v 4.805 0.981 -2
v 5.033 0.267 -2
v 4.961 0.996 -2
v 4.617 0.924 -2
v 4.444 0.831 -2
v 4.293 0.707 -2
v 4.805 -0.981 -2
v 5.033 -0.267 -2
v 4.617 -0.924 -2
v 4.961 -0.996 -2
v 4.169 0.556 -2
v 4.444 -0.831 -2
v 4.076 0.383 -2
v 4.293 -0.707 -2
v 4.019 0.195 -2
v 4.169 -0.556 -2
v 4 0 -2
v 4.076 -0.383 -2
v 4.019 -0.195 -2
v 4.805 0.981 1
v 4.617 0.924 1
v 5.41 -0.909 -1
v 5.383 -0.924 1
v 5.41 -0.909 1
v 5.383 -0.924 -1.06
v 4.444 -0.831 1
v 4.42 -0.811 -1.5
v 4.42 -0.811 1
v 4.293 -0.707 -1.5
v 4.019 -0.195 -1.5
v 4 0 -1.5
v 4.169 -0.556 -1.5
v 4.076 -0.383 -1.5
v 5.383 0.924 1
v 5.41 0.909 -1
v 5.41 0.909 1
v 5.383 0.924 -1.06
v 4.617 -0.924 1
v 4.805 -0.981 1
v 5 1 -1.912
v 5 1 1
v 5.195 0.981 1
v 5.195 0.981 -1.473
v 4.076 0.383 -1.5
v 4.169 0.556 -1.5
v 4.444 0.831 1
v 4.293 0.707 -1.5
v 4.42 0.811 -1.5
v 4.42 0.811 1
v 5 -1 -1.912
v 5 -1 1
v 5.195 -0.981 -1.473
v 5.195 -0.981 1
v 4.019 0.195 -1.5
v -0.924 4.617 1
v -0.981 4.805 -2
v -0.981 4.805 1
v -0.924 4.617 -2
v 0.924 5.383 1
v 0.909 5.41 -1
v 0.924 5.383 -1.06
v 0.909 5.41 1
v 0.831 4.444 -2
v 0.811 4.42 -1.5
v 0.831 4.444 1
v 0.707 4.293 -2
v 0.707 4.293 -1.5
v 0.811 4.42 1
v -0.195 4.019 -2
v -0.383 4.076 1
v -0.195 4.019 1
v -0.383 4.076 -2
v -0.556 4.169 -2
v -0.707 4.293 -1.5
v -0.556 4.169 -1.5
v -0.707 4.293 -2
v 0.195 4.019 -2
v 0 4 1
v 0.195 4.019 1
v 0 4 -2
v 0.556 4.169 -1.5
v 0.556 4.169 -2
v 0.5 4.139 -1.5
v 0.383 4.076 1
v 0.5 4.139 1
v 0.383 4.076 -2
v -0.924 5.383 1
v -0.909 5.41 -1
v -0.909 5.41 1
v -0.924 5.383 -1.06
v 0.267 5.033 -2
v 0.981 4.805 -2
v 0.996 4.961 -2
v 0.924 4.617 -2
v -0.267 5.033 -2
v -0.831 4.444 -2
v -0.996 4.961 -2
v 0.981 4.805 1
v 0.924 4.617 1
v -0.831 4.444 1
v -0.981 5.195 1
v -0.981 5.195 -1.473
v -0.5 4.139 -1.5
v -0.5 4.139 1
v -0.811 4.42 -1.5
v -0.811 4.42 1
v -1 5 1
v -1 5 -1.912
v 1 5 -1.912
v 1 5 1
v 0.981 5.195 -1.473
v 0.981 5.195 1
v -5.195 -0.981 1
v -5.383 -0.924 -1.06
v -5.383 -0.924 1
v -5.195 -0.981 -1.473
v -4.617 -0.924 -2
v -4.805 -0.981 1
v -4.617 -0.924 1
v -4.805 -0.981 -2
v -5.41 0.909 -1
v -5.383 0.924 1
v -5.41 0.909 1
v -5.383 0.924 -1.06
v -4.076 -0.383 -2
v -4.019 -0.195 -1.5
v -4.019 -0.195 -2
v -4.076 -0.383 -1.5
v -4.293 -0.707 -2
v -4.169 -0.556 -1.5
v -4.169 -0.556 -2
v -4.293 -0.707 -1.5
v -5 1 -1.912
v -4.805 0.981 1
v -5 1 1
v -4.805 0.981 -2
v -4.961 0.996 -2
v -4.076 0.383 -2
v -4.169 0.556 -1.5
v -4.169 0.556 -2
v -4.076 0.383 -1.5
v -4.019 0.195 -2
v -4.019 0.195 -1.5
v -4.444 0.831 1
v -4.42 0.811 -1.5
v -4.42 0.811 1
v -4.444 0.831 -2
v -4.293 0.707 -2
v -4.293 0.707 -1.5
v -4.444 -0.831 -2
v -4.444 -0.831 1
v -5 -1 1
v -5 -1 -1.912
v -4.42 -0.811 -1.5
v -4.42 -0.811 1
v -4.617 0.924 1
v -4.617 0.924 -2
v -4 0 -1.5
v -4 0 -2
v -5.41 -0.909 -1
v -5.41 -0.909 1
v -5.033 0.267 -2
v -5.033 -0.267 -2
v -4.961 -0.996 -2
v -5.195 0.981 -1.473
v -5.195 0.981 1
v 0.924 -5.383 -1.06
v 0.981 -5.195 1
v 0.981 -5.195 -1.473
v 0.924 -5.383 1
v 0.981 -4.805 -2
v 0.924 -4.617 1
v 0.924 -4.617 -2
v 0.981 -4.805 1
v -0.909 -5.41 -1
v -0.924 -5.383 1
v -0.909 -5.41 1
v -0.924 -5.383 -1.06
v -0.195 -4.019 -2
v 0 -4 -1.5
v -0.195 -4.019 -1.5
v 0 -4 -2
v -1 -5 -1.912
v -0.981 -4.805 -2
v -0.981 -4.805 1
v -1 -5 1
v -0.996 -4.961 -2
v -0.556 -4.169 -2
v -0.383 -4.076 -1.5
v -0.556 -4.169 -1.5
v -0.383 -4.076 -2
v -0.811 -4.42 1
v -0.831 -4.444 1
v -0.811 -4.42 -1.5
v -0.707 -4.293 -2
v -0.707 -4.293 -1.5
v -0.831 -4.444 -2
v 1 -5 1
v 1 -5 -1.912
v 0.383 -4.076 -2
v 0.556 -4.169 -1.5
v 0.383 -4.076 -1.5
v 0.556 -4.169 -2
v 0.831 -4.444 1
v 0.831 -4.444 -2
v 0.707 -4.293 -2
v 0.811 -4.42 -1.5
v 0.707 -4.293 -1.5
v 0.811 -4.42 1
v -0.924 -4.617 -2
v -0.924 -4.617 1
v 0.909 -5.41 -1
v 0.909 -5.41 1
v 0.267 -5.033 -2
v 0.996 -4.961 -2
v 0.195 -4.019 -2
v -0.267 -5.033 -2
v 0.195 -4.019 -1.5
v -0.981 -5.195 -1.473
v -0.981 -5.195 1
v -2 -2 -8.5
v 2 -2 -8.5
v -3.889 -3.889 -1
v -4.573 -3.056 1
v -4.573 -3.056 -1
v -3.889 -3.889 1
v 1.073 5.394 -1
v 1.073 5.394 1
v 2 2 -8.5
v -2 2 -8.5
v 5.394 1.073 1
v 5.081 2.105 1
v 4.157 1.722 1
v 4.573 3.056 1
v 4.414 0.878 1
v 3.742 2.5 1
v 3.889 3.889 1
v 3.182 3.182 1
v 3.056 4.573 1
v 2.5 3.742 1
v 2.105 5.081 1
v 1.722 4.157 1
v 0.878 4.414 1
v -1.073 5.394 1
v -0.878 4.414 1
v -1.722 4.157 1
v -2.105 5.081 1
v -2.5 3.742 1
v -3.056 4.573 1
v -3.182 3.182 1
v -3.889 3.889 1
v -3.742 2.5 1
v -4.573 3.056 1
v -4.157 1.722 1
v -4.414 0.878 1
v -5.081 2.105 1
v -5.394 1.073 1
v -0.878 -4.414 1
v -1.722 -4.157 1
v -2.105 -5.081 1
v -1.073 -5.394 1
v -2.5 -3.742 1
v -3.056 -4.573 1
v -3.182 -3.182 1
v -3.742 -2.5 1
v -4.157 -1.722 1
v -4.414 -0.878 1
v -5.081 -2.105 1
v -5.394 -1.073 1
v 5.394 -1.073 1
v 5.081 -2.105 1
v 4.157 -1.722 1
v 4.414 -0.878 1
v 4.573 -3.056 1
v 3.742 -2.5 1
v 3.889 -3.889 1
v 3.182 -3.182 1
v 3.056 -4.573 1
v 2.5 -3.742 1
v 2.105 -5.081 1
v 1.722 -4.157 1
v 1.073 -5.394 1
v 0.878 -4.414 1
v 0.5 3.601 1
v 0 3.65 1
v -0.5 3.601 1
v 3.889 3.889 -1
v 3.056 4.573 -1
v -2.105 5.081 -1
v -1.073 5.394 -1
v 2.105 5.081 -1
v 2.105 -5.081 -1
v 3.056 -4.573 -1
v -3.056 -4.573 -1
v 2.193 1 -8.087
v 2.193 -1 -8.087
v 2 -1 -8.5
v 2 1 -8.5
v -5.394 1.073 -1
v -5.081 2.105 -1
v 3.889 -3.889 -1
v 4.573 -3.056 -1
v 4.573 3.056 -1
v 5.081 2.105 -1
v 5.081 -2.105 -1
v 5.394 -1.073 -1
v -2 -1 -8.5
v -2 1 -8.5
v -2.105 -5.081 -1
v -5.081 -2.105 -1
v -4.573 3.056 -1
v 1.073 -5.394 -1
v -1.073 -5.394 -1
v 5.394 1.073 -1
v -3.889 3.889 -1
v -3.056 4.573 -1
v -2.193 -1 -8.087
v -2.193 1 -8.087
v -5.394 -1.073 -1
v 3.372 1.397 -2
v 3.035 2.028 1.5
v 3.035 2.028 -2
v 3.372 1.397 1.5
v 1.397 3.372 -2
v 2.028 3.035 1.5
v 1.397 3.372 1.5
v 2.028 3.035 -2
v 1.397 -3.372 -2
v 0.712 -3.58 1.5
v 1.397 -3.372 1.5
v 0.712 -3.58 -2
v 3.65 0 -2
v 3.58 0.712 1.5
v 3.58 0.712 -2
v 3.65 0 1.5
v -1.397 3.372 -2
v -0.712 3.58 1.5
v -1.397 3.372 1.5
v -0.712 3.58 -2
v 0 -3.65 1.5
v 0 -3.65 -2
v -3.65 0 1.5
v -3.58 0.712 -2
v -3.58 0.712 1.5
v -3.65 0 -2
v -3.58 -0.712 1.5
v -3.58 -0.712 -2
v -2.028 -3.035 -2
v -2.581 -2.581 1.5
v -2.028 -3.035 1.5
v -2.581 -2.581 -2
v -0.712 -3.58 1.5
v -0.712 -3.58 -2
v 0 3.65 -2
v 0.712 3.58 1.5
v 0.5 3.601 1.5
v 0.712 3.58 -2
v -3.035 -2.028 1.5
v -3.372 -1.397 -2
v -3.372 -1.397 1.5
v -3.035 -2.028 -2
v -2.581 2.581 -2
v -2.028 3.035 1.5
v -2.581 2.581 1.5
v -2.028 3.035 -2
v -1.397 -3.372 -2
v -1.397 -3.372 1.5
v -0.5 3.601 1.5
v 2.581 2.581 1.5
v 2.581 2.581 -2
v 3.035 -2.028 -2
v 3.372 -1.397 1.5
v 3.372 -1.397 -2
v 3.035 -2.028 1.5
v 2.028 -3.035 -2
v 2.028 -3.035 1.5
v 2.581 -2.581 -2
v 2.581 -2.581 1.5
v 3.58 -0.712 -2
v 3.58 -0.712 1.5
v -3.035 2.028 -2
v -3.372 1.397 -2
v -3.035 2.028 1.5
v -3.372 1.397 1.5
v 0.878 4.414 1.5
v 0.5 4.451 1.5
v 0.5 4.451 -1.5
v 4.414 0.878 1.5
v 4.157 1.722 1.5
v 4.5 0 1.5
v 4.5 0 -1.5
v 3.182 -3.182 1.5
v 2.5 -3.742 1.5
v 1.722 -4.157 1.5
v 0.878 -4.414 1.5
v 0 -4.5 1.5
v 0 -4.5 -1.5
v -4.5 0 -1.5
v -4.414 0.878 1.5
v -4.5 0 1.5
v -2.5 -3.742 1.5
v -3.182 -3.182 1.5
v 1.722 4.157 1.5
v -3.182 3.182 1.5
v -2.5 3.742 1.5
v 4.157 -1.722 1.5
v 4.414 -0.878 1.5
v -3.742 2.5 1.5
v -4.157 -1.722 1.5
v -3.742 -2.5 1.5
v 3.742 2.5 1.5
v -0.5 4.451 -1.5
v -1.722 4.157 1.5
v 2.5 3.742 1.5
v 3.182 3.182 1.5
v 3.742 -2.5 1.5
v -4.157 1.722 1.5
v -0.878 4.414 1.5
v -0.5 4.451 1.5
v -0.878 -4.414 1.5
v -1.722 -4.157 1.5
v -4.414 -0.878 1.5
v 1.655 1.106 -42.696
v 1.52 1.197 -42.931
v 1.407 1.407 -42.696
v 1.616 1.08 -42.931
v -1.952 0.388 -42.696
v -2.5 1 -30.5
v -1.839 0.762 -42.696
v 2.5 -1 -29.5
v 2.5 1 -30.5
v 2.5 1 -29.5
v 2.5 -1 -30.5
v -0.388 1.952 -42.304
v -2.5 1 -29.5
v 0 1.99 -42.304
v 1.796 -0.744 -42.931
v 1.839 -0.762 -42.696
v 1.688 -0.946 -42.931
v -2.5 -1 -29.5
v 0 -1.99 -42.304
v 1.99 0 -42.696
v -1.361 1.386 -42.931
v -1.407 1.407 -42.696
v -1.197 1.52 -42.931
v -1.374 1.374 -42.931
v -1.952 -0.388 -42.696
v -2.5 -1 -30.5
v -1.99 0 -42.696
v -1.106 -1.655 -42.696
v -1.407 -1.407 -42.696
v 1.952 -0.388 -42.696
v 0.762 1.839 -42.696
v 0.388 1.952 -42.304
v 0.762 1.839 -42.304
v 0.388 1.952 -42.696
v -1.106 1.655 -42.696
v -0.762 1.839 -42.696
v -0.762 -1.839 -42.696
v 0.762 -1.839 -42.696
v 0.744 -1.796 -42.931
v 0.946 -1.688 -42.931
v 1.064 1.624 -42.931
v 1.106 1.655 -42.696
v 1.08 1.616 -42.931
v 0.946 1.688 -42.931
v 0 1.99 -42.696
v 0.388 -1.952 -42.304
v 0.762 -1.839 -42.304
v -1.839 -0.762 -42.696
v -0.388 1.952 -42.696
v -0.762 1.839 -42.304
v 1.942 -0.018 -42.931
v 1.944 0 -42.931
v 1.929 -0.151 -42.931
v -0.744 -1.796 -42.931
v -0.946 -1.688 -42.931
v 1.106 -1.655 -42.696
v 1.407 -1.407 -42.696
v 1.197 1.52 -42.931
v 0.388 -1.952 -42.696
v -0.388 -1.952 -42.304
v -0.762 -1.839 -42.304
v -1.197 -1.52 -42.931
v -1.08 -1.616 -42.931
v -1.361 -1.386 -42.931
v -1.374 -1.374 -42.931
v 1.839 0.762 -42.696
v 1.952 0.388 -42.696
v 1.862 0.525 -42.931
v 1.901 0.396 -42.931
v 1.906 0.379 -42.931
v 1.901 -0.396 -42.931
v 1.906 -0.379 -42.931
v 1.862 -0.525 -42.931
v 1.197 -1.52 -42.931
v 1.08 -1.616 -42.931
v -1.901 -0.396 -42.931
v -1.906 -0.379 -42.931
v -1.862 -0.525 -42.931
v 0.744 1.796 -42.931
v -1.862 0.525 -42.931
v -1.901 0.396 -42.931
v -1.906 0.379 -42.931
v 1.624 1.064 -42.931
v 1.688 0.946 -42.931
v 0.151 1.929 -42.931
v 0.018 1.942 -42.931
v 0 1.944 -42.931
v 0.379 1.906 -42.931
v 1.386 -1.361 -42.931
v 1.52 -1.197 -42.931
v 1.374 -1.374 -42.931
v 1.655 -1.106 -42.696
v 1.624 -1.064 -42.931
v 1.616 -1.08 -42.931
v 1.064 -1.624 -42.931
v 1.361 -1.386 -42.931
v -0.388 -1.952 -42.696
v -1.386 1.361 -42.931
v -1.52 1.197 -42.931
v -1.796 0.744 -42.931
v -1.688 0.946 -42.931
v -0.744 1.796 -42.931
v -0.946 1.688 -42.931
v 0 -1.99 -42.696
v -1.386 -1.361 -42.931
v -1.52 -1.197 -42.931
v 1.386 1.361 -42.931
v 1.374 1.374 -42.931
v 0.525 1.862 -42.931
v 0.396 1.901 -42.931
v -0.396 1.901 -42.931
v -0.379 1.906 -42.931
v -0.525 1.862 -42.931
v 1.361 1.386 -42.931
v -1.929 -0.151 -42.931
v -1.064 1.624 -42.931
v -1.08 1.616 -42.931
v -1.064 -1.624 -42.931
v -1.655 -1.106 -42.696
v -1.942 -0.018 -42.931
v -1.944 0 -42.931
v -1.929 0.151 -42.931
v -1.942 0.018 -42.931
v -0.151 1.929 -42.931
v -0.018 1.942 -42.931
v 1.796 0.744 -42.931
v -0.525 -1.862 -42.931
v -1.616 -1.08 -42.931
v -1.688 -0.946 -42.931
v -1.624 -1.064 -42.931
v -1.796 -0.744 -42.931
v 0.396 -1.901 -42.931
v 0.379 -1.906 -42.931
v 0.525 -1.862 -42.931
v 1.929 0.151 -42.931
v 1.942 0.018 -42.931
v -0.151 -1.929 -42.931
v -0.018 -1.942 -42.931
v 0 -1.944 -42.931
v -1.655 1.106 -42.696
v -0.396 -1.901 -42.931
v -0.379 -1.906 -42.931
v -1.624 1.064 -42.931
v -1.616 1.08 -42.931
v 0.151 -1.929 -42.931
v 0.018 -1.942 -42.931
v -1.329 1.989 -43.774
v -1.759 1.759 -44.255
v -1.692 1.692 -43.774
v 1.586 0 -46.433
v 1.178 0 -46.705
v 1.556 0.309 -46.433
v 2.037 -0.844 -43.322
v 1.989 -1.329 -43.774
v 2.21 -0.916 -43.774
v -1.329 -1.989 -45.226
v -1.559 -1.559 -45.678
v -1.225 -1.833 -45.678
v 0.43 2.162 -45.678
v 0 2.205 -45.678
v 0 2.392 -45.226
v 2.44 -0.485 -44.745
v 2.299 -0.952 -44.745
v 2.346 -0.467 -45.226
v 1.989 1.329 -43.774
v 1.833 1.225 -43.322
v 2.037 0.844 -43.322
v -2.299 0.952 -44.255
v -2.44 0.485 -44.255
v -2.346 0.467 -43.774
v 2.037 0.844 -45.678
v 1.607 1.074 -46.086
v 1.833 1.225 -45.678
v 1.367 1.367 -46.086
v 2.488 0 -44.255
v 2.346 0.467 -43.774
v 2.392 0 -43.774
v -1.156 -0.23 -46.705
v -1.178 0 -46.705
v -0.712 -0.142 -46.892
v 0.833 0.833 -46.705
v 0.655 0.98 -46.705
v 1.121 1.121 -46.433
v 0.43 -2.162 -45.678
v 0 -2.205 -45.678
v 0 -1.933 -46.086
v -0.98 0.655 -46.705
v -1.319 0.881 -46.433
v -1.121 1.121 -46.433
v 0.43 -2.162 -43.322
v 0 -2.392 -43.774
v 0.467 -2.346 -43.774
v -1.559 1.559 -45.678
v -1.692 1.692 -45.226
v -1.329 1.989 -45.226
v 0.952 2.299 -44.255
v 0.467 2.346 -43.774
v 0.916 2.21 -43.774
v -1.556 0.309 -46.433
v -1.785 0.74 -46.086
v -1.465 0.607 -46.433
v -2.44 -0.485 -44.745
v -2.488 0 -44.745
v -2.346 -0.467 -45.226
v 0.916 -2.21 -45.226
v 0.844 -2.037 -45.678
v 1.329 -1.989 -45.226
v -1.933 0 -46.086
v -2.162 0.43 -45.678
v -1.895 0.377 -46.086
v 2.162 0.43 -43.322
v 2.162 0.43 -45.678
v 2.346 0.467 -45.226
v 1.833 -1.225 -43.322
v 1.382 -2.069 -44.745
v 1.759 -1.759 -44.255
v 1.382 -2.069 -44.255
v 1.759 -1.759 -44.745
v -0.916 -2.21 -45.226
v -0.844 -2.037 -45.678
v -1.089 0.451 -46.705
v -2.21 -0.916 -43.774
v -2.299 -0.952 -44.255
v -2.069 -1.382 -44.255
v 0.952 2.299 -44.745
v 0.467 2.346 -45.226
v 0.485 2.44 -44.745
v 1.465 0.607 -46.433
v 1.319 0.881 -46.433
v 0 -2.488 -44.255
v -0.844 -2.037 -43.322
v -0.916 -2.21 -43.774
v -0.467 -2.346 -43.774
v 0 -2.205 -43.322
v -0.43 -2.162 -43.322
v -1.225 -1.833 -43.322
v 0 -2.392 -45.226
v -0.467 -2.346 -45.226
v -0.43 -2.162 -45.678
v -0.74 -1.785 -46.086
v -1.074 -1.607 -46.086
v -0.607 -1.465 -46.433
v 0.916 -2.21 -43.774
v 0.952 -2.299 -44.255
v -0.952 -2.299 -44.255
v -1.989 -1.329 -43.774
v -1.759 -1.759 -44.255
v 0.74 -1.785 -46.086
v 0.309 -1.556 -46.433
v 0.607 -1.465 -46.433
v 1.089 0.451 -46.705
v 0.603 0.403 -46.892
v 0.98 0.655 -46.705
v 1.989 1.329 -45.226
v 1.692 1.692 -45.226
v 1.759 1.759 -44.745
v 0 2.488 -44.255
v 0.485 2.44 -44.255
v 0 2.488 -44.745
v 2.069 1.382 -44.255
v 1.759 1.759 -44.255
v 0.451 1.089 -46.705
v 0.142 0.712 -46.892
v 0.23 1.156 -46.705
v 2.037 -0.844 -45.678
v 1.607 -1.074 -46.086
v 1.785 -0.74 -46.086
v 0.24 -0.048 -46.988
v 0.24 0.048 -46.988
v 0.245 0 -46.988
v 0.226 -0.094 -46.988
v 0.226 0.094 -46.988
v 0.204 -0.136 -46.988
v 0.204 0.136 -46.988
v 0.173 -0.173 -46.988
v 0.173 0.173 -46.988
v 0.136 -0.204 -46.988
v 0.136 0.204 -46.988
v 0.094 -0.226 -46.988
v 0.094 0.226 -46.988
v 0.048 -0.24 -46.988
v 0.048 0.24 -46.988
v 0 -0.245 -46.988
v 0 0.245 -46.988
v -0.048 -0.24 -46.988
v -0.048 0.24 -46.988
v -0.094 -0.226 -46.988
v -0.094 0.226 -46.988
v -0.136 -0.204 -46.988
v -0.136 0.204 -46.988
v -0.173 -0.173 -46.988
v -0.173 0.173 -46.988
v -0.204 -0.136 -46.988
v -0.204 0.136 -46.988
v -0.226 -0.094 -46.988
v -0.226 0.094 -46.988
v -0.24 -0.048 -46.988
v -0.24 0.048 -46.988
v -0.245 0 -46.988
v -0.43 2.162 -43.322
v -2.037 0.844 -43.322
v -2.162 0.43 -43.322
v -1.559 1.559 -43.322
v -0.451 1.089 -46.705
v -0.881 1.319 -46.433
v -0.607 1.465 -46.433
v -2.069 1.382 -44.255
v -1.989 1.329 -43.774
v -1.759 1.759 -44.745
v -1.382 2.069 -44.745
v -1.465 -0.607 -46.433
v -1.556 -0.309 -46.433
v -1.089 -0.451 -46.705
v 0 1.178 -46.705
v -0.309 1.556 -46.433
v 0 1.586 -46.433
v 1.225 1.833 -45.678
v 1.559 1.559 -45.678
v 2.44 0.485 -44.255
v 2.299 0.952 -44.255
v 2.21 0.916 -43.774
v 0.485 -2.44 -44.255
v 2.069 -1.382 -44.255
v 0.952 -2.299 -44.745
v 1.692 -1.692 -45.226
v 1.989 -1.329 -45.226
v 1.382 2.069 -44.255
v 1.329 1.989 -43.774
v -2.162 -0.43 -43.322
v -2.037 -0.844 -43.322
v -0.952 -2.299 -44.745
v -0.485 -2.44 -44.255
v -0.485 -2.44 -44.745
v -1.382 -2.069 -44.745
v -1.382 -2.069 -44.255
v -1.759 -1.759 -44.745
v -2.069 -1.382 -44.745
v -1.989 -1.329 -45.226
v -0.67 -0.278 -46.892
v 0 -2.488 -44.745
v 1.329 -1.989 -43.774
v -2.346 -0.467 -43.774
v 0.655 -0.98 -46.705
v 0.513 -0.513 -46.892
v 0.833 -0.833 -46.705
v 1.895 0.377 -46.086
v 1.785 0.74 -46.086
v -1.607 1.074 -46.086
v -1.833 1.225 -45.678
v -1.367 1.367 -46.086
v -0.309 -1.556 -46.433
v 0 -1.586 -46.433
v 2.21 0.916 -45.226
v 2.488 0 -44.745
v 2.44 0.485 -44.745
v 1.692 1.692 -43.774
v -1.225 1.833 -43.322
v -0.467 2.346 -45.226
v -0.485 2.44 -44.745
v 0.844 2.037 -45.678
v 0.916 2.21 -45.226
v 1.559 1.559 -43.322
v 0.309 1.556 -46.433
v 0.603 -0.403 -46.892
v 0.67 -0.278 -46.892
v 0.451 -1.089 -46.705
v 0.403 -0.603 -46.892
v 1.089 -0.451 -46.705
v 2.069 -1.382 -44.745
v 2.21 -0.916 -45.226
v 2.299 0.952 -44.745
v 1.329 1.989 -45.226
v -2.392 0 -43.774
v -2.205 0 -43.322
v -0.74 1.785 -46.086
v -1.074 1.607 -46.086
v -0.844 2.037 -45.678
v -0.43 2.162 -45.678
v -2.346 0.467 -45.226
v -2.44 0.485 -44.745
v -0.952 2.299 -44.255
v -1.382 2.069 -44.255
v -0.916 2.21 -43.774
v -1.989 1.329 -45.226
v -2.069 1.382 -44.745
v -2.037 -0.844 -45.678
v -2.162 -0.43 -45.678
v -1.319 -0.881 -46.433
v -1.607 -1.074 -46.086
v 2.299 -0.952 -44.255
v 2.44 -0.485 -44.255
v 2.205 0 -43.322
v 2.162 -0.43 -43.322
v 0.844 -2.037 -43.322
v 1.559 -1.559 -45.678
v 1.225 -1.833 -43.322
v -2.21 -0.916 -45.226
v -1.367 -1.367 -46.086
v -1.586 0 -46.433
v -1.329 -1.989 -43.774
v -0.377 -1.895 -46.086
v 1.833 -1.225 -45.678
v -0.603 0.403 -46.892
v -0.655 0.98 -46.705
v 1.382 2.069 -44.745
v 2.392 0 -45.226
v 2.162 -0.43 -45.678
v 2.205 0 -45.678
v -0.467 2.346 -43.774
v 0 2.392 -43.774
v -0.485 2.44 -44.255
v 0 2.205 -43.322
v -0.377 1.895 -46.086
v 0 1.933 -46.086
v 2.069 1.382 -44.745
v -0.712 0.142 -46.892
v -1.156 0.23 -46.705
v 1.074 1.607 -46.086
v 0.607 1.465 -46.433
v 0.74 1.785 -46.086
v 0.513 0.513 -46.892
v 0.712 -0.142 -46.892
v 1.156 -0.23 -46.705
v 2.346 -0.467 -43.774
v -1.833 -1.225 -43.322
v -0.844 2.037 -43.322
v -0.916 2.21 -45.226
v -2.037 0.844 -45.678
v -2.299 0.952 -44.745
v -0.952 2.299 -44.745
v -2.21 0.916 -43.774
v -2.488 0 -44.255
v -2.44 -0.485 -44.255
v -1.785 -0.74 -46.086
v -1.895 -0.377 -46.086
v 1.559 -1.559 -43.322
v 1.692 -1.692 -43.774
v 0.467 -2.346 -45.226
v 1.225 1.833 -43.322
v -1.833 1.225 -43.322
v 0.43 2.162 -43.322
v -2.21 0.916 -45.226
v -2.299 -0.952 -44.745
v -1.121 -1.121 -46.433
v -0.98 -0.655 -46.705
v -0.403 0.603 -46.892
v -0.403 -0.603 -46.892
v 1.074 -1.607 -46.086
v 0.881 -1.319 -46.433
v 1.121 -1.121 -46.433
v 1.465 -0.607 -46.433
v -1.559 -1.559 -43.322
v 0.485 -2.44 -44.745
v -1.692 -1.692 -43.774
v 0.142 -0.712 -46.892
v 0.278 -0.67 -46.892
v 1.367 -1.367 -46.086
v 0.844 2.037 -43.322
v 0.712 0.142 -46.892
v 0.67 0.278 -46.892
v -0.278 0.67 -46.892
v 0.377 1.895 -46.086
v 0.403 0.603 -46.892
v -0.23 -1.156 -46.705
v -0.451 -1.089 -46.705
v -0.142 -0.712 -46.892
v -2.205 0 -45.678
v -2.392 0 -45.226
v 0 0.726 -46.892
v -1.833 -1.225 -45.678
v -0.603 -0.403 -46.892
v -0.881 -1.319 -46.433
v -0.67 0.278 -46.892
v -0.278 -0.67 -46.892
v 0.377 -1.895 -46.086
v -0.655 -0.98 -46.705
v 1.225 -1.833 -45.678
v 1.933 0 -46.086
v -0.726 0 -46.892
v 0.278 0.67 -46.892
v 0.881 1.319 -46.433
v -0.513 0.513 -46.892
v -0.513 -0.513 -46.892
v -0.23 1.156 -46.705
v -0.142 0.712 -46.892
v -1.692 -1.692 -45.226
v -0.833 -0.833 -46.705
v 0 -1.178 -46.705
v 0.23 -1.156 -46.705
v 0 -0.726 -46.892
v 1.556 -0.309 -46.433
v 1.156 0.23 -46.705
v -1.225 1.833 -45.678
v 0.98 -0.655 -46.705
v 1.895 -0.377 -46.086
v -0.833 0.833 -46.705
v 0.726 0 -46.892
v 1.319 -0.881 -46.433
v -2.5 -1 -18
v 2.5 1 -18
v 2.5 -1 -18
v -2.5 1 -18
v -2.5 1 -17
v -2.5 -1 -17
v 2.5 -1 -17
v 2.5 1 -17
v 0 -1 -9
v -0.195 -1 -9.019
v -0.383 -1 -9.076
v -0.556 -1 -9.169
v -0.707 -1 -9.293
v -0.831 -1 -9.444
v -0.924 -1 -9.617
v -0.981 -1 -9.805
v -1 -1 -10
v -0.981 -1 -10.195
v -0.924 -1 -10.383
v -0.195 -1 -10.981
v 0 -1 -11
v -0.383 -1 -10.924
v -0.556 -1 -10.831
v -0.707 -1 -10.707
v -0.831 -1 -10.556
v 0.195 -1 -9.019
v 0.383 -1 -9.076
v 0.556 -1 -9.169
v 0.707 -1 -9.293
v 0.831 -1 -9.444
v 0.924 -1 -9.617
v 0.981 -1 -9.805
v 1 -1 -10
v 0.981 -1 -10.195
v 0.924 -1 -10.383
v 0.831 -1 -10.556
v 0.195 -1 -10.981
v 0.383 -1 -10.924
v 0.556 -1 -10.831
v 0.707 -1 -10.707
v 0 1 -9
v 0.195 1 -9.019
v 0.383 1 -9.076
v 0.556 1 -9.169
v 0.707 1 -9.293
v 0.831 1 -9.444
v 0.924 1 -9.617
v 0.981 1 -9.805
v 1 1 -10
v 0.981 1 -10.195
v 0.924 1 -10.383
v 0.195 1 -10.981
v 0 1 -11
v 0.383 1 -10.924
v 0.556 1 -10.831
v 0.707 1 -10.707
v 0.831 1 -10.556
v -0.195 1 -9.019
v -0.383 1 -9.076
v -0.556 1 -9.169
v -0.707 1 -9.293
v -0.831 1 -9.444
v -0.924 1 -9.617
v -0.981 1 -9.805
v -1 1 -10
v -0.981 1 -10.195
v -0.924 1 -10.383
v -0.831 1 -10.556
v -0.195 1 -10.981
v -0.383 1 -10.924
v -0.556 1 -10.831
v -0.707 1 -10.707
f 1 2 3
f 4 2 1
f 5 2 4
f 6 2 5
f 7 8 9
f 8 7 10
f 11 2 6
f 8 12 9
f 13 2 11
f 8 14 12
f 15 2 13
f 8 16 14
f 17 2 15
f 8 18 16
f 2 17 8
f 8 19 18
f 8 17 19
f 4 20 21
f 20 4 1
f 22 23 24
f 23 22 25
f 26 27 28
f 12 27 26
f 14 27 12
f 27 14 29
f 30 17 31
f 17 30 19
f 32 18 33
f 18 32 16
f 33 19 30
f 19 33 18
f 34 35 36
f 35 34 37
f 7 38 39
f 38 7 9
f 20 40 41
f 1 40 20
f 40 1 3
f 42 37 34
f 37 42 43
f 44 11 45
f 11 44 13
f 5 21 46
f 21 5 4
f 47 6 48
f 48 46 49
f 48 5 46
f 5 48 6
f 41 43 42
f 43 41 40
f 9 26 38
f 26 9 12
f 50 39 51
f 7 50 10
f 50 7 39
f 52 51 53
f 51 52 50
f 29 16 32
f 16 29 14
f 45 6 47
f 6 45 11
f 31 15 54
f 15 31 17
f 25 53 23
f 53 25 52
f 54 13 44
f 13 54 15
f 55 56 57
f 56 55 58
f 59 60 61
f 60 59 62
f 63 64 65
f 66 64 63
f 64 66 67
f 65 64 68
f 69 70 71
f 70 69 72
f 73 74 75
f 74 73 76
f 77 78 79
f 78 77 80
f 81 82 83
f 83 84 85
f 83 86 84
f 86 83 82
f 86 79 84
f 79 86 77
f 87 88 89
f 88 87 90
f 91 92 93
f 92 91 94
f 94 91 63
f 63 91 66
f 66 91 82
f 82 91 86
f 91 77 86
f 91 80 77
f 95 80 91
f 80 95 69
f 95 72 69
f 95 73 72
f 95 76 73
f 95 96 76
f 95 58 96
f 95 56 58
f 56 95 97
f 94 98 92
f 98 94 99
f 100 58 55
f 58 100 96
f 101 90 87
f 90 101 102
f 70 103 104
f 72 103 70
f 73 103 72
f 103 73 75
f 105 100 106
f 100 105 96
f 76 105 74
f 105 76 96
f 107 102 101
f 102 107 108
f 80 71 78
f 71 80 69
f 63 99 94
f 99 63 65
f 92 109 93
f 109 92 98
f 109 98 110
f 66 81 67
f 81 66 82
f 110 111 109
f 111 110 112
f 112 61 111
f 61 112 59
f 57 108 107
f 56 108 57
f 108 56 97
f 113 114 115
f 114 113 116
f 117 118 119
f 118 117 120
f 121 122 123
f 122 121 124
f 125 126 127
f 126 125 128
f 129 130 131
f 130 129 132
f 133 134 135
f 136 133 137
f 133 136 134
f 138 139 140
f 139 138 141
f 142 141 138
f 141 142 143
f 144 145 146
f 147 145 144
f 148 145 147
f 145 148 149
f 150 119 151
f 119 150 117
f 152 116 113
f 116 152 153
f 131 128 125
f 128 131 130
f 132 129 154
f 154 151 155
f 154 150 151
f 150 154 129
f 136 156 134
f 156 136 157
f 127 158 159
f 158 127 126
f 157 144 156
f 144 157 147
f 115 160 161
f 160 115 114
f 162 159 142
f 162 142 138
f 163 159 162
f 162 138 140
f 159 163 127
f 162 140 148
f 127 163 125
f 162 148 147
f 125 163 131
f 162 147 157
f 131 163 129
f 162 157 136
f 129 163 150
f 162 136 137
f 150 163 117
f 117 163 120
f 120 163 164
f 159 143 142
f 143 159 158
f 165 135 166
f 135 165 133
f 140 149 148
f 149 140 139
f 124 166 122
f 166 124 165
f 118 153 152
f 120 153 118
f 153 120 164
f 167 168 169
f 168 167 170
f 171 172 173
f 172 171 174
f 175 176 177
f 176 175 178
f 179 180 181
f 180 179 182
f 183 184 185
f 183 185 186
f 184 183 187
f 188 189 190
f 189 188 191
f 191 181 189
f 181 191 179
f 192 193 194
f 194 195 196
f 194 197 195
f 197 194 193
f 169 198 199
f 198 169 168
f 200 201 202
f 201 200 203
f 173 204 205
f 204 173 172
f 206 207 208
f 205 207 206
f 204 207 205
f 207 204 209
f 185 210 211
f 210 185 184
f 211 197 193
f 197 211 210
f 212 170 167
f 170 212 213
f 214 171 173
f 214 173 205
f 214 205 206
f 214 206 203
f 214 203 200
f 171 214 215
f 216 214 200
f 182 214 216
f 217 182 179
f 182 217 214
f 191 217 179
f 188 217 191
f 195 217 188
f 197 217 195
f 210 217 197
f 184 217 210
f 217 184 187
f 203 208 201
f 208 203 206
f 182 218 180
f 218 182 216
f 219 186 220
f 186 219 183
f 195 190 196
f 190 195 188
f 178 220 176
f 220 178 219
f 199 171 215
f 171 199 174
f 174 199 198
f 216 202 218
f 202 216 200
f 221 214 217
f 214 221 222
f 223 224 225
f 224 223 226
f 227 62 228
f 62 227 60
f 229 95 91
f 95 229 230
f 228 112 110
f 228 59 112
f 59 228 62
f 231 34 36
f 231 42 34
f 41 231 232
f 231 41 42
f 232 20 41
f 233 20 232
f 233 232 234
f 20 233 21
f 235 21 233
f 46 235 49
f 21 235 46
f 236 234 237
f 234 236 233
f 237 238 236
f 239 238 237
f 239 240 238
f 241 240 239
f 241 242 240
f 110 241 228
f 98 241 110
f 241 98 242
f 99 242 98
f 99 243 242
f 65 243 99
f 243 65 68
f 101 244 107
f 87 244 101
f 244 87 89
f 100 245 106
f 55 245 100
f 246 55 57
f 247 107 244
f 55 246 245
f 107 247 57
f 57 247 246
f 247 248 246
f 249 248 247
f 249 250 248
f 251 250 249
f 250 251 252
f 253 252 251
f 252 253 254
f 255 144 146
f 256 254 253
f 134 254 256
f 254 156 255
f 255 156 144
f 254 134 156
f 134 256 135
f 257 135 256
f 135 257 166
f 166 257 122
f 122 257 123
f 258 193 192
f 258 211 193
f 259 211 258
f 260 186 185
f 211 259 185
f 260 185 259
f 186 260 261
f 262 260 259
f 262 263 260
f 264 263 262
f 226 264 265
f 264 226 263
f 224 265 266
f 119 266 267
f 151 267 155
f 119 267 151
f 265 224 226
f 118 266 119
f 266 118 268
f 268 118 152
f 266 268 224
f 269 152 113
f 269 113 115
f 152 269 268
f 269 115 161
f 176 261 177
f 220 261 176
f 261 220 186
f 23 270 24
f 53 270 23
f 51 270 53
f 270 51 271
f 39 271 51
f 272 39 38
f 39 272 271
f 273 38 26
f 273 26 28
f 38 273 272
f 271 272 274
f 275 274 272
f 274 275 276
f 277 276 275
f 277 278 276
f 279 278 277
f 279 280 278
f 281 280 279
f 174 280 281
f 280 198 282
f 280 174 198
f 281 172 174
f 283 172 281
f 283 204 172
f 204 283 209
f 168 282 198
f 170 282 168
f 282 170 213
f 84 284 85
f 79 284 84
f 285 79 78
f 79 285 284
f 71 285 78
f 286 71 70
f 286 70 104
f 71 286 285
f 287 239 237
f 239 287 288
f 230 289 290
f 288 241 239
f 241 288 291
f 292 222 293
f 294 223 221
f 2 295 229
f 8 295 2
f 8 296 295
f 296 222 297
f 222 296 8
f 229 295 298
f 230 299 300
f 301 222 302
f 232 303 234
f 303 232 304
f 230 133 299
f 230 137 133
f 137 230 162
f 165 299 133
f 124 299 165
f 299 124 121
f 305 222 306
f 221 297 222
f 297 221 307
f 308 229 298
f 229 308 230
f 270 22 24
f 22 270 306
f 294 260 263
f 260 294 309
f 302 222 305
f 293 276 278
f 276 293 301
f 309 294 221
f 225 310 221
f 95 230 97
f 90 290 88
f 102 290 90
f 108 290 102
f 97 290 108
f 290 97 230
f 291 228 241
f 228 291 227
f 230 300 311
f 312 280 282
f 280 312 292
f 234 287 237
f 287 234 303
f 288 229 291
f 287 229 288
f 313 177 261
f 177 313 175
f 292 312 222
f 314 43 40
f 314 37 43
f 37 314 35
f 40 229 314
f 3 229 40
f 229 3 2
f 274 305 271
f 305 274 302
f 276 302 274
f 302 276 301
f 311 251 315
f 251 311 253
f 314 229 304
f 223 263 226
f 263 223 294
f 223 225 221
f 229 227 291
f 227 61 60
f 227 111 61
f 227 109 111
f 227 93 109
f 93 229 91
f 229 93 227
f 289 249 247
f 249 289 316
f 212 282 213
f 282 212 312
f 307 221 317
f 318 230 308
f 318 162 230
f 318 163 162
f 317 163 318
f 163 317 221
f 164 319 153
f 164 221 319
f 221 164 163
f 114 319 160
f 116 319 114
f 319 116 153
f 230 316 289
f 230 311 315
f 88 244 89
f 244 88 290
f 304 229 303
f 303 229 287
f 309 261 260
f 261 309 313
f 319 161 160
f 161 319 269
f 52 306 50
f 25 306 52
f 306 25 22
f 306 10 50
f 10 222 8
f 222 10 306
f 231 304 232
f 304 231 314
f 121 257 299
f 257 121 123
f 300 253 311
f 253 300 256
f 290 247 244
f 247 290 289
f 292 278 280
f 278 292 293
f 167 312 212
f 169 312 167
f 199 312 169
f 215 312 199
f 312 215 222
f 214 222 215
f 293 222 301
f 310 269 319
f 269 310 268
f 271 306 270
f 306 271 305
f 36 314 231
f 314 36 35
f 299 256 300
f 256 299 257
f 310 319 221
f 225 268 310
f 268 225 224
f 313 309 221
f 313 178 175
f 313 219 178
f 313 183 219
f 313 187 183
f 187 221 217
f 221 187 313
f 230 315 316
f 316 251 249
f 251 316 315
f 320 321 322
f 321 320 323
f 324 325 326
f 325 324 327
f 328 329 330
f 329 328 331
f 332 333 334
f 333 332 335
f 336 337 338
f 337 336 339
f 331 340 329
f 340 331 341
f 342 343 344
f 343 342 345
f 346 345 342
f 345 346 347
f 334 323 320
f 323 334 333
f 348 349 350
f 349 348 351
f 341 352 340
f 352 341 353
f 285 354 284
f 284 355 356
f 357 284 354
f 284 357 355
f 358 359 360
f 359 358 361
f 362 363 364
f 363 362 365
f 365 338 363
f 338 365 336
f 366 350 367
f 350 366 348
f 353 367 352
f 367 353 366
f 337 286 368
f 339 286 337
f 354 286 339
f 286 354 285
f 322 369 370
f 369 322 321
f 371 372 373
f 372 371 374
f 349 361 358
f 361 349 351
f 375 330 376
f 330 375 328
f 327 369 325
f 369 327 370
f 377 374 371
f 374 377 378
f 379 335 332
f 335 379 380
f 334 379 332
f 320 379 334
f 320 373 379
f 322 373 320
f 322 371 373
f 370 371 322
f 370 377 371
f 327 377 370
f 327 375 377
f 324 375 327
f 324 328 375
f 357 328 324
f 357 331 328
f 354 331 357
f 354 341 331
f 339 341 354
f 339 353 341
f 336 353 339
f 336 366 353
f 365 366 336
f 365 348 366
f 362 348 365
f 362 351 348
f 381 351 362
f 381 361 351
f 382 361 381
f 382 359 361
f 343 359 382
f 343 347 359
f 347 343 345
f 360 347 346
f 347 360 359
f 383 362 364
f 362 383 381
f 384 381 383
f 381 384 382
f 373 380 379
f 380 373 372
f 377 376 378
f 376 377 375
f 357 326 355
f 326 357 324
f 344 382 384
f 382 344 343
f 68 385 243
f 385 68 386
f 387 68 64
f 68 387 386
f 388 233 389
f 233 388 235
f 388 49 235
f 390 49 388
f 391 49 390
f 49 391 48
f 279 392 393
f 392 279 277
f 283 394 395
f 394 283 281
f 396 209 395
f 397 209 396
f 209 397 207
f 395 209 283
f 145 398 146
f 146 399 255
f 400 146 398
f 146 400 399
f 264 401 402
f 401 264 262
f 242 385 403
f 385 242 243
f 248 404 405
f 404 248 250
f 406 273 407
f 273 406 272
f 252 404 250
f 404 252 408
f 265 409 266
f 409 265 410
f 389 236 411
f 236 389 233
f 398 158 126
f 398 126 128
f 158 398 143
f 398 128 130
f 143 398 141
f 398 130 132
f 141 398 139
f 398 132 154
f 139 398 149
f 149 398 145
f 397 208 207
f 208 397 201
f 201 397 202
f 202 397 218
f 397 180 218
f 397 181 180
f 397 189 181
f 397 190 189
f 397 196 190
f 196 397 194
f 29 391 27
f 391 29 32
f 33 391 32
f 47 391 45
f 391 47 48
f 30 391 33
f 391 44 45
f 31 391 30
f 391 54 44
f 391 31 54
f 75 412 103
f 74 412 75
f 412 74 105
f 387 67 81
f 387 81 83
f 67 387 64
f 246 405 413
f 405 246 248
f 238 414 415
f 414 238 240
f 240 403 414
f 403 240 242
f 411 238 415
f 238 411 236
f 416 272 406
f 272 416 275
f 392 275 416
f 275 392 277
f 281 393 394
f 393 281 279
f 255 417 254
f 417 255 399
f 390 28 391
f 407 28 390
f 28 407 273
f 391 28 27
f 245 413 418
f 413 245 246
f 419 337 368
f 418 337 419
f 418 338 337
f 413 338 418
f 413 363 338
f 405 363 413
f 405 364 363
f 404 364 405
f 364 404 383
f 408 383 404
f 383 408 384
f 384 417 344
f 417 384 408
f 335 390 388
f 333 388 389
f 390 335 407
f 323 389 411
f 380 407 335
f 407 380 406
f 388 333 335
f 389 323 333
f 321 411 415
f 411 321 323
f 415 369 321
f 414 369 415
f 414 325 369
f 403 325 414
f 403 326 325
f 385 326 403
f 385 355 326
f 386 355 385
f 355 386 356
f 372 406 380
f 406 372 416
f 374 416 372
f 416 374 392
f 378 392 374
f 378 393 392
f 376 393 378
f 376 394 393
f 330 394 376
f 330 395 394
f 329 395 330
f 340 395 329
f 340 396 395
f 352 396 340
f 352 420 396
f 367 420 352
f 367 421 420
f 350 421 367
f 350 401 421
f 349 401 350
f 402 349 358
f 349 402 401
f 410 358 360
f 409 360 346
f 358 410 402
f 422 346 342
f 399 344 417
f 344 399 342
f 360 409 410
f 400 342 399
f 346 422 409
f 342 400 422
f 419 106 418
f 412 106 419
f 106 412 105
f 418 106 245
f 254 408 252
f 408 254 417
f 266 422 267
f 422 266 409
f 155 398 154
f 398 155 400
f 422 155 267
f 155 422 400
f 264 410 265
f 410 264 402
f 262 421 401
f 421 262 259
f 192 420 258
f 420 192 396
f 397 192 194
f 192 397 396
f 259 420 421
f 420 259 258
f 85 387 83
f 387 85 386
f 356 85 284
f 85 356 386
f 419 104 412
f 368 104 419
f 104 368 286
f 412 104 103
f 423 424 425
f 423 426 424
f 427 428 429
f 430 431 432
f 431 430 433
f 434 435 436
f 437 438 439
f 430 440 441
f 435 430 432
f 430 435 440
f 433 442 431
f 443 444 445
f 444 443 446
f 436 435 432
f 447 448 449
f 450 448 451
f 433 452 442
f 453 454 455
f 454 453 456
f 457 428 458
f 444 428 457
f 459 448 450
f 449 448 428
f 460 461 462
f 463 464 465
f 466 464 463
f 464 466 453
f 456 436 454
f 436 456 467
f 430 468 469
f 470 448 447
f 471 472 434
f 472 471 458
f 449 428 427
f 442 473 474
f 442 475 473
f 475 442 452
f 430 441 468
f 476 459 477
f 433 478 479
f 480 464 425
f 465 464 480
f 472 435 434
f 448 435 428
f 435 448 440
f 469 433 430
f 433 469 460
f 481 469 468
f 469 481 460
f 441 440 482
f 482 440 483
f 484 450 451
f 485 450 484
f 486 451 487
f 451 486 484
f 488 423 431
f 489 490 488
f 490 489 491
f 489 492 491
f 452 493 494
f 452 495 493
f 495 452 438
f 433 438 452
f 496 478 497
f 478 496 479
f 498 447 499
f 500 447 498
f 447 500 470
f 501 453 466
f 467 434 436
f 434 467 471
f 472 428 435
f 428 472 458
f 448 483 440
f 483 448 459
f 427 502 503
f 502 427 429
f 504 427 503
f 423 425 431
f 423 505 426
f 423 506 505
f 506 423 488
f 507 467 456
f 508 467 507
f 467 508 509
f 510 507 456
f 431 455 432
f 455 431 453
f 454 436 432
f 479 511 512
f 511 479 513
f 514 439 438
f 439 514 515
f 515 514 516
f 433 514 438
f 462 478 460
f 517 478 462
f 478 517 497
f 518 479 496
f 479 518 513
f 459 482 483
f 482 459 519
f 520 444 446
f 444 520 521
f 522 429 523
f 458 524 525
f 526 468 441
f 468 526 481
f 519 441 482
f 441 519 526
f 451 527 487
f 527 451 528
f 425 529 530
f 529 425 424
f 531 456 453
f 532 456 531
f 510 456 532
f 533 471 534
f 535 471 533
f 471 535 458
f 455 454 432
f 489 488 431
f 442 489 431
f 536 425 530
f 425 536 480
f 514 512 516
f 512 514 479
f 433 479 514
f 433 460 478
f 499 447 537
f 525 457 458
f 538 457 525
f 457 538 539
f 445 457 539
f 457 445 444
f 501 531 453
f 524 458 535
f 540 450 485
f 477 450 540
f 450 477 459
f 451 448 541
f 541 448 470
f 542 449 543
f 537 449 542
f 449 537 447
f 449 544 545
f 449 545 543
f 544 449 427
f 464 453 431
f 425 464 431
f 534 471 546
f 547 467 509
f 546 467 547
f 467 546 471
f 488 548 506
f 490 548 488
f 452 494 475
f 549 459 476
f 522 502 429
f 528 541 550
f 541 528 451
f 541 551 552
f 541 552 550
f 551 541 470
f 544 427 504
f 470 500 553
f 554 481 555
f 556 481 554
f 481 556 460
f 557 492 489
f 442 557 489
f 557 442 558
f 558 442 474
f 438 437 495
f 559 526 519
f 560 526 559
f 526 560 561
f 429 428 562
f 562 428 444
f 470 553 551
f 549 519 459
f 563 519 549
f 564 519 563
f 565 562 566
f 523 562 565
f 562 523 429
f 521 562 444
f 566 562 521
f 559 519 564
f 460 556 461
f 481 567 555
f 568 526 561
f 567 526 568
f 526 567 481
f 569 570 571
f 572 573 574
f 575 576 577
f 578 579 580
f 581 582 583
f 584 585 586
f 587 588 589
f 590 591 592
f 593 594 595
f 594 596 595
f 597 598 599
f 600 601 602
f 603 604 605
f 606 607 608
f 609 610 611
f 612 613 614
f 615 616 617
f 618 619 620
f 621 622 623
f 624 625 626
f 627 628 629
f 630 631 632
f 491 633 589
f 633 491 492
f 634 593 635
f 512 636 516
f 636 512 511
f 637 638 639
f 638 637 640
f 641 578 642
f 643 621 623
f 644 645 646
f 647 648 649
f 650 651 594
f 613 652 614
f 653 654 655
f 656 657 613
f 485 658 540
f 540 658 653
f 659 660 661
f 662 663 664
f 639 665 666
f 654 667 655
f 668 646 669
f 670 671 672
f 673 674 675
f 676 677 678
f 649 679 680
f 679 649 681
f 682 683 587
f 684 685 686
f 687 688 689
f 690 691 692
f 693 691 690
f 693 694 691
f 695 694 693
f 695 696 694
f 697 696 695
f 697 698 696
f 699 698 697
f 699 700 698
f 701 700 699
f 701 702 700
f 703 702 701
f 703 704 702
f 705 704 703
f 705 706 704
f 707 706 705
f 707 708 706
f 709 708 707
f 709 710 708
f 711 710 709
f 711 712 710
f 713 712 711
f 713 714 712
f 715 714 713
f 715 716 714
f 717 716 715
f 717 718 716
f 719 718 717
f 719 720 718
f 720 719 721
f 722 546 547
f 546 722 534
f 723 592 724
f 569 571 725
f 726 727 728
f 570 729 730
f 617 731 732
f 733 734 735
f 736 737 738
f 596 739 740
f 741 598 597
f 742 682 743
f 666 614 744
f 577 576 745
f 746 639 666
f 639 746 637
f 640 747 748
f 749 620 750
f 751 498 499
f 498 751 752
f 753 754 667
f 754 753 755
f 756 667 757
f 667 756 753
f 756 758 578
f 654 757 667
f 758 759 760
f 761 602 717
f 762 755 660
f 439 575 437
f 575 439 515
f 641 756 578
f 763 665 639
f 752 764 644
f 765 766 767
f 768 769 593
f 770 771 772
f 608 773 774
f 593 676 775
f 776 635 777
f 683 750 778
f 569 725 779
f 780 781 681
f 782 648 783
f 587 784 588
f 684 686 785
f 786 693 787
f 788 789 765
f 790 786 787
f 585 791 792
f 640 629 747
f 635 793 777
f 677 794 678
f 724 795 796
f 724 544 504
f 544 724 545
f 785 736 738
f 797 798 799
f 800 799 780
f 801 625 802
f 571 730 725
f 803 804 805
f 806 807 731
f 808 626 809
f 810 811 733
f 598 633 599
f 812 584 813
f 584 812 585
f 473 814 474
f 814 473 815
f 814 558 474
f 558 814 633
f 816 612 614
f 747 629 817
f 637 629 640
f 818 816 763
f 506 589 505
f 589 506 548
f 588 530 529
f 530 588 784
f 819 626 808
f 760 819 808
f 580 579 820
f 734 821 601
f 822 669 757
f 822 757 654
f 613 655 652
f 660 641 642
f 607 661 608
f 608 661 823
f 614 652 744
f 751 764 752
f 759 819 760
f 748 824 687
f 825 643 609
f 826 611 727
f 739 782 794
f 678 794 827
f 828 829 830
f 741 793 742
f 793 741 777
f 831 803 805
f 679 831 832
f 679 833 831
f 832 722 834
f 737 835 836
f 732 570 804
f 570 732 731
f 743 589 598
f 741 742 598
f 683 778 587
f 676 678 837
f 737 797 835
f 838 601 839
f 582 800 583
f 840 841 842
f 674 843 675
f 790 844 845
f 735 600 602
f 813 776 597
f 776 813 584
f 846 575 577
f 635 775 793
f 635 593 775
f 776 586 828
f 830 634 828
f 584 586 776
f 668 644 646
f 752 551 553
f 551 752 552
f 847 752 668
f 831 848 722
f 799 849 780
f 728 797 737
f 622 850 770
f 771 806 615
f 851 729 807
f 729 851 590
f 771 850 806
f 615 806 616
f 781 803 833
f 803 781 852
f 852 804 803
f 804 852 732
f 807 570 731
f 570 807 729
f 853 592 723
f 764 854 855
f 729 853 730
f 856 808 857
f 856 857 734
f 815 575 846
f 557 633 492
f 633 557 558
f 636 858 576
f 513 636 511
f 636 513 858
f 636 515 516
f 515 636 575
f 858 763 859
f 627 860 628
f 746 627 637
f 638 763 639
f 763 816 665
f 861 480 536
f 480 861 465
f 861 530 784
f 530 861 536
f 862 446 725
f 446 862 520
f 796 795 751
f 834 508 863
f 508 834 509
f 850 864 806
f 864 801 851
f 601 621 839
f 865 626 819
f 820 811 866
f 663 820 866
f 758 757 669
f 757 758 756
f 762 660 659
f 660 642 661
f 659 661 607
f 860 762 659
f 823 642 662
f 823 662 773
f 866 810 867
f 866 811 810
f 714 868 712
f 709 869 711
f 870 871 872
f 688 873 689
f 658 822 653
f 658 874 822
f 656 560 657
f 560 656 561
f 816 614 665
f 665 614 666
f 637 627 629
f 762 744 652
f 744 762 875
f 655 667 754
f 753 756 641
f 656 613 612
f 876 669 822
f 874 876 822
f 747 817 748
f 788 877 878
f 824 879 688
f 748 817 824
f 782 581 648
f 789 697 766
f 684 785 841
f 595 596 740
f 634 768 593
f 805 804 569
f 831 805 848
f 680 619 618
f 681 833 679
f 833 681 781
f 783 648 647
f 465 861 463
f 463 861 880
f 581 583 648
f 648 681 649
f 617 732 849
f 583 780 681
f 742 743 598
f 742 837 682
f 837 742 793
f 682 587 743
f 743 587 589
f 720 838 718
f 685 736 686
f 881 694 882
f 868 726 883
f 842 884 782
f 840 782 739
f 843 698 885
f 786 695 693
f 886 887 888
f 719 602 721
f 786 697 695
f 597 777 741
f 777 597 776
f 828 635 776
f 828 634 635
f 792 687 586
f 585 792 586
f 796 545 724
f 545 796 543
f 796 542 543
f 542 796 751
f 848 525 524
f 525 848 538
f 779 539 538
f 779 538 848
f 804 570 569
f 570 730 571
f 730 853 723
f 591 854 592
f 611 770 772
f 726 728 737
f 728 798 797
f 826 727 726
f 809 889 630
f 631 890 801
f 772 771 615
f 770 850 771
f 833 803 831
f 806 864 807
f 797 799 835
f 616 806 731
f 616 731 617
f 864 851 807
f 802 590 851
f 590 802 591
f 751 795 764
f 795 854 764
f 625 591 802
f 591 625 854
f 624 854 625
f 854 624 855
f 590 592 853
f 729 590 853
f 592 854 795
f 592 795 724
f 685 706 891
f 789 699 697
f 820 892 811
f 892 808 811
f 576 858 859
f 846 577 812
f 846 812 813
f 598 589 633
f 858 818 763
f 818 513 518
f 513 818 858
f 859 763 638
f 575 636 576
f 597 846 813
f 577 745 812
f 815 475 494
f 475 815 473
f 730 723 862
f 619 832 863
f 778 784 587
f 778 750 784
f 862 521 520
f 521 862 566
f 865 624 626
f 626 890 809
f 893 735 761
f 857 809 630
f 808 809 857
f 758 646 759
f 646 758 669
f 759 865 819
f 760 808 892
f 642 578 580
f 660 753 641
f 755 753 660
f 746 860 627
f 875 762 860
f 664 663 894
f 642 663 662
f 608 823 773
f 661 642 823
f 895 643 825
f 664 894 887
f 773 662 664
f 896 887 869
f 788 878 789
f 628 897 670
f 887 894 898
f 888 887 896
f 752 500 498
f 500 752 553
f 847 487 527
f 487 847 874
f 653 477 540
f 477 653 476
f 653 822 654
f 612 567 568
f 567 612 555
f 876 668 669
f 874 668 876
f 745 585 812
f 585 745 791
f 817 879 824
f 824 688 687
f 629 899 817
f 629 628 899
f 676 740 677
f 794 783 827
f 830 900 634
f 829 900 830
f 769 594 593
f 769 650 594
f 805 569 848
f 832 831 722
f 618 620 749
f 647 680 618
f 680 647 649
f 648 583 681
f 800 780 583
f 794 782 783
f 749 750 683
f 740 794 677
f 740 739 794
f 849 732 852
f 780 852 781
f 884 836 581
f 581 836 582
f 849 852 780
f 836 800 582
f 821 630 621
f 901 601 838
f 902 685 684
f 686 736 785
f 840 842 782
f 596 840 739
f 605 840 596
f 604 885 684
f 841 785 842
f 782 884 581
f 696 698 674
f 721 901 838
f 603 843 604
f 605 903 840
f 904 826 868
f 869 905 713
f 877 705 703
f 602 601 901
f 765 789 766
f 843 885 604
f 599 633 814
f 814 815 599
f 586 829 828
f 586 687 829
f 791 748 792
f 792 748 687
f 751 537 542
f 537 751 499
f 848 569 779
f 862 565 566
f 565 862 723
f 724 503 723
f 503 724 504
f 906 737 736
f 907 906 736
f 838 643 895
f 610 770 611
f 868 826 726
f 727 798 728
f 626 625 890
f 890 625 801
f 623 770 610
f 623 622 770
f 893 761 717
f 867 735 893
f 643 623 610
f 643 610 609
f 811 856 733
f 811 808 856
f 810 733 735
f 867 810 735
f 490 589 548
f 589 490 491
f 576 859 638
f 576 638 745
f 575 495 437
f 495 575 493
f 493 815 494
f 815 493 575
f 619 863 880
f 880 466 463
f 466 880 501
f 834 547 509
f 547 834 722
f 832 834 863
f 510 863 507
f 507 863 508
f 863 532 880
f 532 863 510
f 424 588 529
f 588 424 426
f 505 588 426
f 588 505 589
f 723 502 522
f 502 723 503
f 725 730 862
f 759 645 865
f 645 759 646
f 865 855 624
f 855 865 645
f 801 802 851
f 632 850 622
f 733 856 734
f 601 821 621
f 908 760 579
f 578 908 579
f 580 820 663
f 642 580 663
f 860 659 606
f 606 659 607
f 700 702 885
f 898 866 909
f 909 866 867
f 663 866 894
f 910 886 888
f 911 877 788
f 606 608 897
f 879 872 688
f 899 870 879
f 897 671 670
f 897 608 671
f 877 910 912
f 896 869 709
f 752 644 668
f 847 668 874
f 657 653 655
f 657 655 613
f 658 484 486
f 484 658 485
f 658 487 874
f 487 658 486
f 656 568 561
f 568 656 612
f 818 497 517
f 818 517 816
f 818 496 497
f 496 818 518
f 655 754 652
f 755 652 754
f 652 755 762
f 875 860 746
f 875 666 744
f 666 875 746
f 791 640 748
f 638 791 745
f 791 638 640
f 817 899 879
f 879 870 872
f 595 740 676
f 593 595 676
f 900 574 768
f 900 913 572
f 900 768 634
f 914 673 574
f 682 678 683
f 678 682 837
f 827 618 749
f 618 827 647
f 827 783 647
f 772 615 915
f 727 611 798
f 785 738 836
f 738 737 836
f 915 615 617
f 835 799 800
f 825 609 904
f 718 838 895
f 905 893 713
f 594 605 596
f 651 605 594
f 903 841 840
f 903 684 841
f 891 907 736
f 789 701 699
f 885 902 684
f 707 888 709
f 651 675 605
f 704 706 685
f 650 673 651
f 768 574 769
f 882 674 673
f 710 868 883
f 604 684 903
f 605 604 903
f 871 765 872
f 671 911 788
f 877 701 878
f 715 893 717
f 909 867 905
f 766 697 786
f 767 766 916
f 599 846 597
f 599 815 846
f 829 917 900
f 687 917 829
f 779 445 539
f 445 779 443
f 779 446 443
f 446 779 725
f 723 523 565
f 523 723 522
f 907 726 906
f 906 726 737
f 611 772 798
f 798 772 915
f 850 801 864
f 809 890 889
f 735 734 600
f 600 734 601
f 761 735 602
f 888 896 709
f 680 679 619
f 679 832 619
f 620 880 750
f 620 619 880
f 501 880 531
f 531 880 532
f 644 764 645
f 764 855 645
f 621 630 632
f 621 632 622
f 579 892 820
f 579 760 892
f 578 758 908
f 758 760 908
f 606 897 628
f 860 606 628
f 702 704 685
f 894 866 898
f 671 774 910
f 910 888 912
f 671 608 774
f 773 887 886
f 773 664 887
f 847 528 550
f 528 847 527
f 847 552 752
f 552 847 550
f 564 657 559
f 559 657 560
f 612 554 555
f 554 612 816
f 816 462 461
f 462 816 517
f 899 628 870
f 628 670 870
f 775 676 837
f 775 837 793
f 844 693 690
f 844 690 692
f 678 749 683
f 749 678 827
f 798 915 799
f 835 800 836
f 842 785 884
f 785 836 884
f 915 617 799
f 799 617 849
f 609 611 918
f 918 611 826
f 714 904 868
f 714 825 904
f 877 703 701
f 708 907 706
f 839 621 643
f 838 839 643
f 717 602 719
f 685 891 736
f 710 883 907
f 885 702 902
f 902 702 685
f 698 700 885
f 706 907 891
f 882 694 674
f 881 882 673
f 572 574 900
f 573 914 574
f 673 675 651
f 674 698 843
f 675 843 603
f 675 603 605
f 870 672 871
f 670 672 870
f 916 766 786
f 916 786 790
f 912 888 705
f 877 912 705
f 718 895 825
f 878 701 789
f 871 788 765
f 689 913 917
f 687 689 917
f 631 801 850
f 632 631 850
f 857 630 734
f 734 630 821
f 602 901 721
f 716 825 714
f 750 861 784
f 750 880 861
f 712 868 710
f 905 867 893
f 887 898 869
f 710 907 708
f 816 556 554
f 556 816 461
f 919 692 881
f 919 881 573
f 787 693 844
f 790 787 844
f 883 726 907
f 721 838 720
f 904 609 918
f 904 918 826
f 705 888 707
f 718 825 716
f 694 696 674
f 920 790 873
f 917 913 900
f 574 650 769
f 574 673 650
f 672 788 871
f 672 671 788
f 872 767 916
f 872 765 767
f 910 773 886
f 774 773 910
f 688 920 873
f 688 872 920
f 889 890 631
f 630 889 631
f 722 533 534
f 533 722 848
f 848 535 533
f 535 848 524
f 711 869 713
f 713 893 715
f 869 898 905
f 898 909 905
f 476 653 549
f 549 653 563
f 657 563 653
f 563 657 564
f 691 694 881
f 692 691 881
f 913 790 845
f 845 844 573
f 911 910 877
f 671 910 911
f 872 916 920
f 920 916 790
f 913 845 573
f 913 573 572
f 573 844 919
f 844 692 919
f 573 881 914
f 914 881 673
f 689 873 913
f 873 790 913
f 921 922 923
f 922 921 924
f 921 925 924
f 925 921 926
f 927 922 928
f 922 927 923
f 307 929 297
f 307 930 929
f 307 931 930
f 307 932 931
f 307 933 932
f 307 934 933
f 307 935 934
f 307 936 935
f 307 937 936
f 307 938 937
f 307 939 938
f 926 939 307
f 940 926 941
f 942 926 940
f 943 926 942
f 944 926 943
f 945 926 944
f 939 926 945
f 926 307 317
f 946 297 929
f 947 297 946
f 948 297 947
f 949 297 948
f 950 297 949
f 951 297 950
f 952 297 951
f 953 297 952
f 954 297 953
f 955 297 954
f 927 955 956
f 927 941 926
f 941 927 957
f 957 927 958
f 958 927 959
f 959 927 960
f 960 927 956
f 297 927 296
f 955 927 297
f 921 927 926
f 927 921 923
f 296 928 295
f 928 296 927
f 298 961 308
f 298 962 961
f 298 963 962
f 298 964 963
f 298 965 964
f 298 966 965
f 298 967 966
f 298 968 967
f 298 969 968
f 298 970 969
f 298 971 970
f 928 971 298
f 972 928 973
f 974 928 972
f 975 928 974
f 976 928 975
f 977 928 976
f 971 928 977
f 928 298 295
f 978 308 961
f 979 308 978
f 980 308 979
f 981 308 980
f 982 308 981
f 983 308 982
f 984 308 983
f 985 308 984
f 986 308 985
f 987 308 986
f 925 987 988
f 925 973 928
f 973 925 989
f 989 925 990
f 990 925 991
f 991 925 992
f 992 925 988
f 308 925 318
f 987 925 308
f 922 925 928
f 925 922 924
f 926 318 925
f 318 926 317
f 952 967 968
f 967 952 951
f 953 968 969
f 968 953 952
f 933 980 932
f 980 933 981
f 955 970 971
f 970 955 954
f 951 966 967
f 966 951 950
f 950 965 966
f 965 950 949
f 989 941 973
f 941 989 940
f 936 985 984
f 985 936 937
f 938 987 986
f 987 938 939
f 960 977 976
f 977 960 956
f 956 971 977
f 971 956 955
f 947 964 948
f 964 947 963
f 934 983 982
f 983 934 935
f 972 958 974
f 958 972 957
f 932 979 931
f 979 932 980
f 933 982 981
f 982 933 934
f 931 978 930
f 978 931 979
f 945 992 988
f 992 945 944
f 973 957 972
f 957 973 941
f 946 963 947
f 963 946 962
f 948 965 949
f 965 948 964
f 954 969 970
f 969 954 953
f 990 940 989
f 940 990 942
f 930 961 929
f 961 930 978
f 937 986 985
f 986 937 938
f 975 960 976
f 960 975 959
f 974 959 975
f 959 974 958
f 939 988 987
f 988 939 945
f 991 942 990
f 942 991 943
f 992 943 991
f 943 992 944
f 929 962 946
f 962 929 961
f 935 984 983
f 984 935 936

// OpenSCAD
// file: config.scad
// ============================================
// NuiBone - 共通設定ファイル
// ============================================
// 15cmぬいぐるみ用ロボット骨格の寸法設定
// ============================================

// --- ぬいぐるみサイズ制約 ---
nui_height = 150;        // ぬいぐるみ全高 (mm)
nui_body_width = 40;     // 胴体最大幅 (mm)
nui_body_depth = 25;     // 胴体最大厚み (mm)

// --- 骨格寸法 ---
bone_thickness = 2.5;    // 骨格基本厚み (mm)
bone_width = 3;          // 骨格基本幅 (mm)

// 胴体フレーム
body_height = 45;        // 胴体高さ (mm)
body_width = 35;         // 胴体幅 (mm)
body_depth = 20;         // 胴体奥行き (mm)

// 肩
shoulder_width = 8;      // 肩部品幅 (mm)
shoulder_offset = 15;    // 肩の高さ位置（胴体上端から）

// 腕
arm_length = 35;         // 腕の長さ (mm)
arm_width = 4;           // 腕の幅 (mm)
arm_thickness = 2;       // 腕の厚み (mm)

// 足
foot_width = 12;         // 足幅 (mm)
foot_length = 15;        // 足長さ (mm)
foot_height = 5;         // 足高さ (mm)
leg_length = 30;         // 脚の長さ (mm)

// --- SG90サーボ寸法 ---
sg90_width = 12.2;       // サーボ幅 (mm)
sg90_height = 22.5;      // サーボ高さ (mm)
sg90_depth = 22.5;       // サーボ奥行き (mm)
sg90_shaft_height = 4;   // 出力軸高さ (mm)
sg90_shaft_dia = 4.8;    // 出力軸直径 (mm)
sg90_mount_hole = 2;     // 取付穴径 (mm)
sg90_mount_dist = 28;    // 取付穴間距離 (mm)
sg90_flange_width = 32.5; // フランジ幅 (mm)
sg90_flange_thick = 2.5; // フランジ厚み (mm)

// --- 磁石・重り ---
magnet_dia = 5;          // ネオジム磁石直径 (mm)
magnet_height = 2;       // ネオジム磁石高さ (mm)
weight_hole_dia = 6;     // 重り穴直径 (mm)

// --- 呼吸機構 ---
breath_stroke = 3;       // 呼吸ストローク (mm)
breath_plate_size = 15;  // 呼吸プレートサイズ (mm)

// --- 印刷設定 ---
wall_thick = 1.2;        // 壁厚み (mm)
tolerance = 0.3;         // 組み立て公差 (mm)
$fn = 32;                // 円の分割数

// --- 色設定（プレビュー用）---
color_bone = [0.9, 0.9, 0.85];
color_servo = [0.2, 0.2, 0.3];
color_magnet = [0.7, 0.7, 0.7];
// main file
// ============================================
// NuiBone - 腕ボーン
// ============================================
// サーボホーンに接続する腕の骨
// 左右共通（ミラーして使用）
// ============================================

include <config.scad>

// --- 腕ボーン ---
module arm_bone() {
    difference() {
        union() {
            // サーボホーン接続部（肩側）
            servo_horn_connector();

            // 上腕部
            translate([0, 0, 0])
                upper_arm();

            // 前腕部
            translate([0, 0, -arm_length + 5])
                forearm();
        }

        // 軽量化穴
        lightening_holes();
    }
}

// --- サーボホーン接続部 ---
module servo_horn_connector() {
    // SG90の付属ホーンに接続する部分
    horn_hole_dia = 2;      // ホーン取付穴
    horn_center_dia = 7;    // ホーン中心部直径

    difference() {
        // 接続ベース
        hull() {
            cylinder(h=arm_thickness, d=horn_center_dia + 4, center=true);
            translate([0, 0, -8])
                cube([arm_width, arm_width, 1], center=true);
        }

        // ホーン中心穴
        cylinder(h=arm_thickness + 2, d=horn_center_dia + tolerance, center=true);

        // ホーン固定穴（ネジ用）
        for (a = [0, 90, 180, 270]) {
            rotate([0, 0, a])
                translate([horn_center_dia/2 + 1.5, 0, 0])
                    cylinder(h=arm_thickness + 2, d=horn_hole_dia, center=true);
        }
    }

    // ホーンをクランプするリング
    difference() {
        cylinder(h=arm_thickness + 1, d=horn_center_dia + 2, center=true);
        cylinder(h=arm_thickness + 3, d=horn_center_dia + tolerance, center=true);

        // スリット（弾性確保）
        translate([0, horn_center_dia/2, 0])
            cube([1, 3, arm_thickness + 3], center=true);
    }
}

// --- 上腕部 ---
module upper_arm() {
    hull() {
        translate([0, 0, -3])
            cube([arm_width, arm_thickness, 1], center=true);
        translate([0, 0, -arm_length/2])
            cube([arm_width + 1, arm_thickness, 1], center=true);
    }
}

// --- 前腕部 ---
module forearm() {
    hull() {
        cube([arm_width + 1, arm_thickness, 1], center=true);
        translate([0, 0, -arm_length/2 + 5])
            sphere(d=arm_width);
    }

    // 手先の丸み
    translate([0, 0, -arm_length/2 + 3])
        sphere(d=arm_width + 1);
}

// --- 軽量化穴 ---
module lightening_holes() {
    // 上腕の軽量化
    for (z = [-10, -20]) {
        translate([0, 0, z])
            rotate([90, 0, 0])
                cylinder(h=arm_thickness + 2, d=2, center=true);
    }
}

// --- 腕ボーン（サーボホーン一体型）---
// サーボに直接取り付けるバージョン
module arm_bone_direct() {
    difference() {
        union() {
            // サーボ軸接続部
            cylinder(h=3, d=sg90_shaft_dia + 2);

            // 腕本体
            translate([0, 0, 0])
                hull() {
                    cylinder(h=3, d=8);
                    translate([0, 0, -arm_length])
                        sphere(d=arm_width);
                }
        }

        // サーボ軸穴（Dカット対応）
        difference() {
            cylinder(h=5, d=sg90_shaft_dia + tolerance, center=true);
            translate([sg90_shaft_dia/2, 0, 0])
                cube([1, sg90_shaft_dia, 6], center=true);
        }

        // 固定ネジ穴
        translate([0, 0, 1.5])
            rotate([90, 0, 0])
                cylinder(h=10, d=2, center=true);
    }
}

// --- メイン出力 ---
arm_bone();

// 直接取付バージョン（コメントアウトで切替）
// translate([20, 0, 0]) arm_bone_direct();
